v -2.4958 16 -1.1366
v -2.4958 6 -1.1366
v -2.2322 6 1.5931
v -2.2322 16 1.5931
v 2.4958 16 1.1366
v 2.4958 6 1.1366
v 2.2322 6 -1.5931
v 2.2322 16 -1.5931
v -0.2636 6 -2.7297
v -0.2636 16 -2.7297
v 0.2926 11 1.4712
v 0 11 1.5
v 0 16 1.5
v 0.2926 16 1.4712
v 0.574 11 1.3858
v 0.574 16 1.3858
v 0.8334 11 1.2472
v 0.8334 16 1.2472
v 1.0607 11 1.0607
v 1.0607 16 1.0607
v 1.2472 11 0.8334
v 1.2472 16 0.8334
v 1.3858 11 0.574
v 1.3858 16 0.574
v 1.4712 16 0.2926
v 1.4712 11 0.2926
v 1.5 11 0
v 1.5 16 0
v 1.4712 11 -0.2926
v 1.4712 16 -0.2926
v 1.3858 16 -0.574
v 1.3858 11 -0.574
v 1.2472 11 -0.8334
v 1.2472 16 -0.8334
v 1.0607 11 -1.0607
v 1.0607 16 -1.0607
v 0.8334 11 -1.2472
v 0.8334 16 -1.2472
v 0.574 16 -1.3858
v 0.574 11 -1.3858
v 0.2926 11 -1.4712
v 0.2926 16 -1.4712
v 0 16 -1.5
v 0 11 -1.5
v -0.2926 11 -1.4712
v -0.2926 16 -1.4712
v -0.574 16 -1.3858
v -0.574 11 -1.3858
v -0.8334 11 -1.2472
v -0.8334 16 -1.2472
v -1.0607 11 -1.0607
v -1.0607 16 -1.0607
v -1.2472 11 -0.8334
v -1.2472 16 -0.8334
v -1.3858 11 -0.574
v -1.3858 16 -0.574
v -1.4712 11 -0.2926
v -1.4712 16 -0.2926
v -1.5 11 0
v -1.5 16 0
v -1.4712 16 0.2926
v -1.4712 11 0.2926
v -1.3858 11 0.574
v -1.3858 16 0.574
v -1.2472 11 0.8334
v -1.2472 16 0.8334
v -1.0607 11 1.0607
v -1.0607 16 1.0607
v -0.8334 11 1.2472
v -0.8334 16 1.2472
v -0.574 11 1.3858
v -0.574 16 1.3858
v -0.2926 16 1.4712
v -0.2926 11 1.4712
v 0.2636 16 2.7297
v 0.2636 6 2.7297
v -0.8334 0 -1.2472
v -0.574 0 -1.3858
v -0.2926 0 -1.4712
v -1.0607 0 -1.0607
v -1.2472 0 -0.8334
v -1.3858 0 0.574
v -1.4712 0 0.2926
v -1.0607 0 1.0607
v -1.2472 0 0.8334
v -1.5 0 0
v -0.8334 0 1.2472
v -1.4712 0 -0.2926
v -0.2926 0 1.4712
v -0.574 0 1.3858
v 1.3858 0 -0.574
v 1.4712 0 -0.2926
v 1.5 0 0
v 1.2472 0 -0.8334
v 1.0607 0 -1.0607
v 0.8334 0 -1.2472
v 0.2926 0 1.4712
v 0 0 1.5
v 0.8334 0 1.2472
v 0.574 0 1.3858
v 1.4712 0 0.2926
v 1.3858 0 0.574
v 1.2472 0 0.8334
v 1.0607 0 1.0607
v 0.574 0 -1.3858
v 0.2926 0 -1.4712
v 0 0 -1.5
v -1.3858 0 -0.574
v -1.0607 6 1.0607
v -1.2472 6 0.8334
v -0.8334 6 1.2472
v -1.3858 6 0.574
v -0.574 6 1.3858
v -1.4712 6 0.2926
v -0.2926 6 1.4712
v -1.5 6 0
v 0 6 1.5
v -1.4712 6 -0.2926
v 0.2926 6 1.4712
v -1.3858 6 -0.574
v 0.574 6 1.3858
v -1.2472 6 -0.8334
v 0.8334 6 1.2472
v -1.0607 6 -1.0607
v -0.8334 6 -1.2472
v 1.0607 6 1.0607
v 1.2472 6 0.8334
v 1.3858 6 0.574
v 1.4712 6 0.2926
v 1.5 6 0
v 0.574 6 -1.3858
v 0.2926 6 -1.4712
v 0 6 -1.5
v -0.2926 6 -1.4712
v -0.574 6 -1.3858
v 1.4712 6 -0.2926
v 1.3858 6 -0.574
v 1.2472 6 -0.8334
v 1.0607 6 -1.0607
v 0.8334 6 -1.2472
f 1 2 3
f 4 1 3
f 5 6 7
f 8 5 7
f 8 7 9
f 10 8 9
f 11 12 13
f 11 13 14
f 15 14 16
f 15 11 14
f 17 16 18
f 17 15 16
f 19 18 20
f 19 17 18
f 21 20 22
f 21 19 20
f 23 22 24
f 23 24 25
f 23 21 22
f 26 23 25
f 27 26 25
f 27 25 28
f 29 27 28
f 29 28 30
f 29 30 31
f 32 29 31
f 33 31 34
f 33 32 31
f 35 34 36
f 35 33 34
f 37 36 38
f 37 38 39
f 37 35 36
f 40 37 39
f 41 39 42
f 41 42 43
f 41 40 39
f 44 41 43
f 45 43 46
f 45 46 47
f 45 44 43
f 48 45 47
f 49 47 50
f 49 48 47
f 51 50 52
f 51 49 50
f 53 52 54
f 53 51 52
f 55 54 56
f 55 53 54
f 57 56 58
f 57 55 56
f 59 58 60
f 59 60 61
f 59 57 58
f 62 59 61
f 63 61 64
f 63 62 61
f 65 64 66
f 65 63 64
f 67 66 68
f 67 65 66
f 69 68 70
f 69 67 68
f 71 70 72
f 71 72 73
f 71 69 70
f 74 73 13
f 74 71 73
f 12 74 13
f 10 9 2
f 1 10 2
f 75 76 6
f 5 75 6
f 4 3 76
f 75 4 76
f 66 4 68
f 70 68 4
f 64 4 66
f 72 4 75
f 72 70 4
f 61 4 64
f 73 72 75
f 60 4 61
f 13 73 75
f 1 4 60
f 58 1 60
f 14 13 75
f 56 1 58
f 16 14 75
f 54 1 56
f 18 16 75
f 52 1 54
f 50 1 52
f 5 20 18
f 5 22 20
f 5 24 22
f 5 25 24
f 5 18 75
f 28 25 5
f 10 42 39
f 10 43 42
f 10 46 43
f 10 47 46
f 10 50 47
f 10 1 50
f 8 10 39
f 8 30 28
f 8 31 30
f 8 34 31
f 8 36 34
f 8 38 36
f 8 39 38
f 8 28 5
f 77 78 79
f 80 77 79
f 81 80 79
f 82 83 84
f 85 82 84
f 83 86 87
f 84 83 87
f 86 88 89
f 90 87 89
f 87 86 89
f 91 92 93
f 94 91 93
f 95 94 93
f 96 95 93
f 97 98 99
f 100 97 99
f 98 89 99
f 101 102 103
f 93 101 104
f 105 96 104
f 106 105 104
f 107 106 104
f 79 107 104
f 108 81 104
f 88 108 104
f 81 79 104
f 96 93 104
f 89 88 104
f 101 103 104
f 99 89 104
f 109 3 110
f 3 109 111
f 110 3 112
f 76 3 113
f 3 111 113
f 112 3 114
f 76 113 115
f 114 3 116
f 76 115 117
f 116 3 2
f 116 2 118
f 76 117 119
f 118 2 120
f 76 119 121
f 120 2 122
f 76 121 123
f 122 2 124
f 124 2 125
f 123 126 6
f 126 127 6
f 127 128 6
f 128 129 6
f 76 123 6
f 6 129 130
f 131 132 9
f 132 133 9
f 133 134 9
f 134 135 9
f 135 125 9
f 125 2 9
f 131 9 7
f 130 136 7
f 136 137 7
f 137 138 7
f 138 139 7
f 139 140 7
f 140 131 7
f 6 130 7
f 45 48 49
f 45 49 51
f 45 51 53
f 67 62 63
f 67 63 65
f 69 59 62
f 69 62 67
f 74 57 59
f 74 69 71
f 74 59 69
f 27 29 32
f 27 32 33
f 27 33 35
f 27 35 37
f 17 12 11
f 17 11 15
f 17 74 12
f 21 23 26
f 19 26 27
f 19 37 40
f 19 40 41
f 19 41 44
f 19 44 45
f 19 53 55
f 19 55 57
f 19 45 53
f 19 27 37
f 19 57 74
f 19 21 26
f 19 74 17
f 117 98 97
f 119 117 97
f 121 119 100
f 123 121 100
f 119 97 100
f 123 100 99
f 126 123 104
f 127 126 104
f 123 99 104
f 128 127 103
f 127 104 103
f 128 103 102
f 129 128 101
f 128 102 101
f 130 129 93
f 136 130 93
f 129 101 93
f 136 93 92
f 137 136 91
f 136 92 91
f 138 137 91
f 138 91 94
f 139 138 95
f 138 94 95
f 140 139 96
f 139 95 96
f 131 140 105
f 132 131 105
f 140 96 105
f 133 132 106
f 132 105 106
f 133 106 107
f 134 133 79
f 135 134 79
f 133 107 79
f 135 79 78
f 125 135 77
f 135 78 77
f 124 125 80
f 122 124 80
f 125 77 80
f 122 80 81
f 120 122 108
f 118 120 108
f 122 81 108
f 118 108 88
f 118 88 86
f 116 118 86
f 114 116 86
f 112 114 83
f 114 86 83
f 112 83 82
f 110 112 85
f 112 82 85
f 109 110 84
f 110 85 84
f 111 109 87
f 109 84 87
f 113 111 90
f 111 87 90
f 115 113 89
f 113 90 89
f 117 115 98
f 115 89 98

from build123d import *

# Parameters (mm, degrees)
SKETCH_1_R          = 1.5
EXTRUDE_1_DEPTH     = 6
EXTRUDE_2_DEPTH     = 10
CUT_EXTRUDE_START   = -5
SKETCH_3_R          = 1.5
CUT_EXTRUDE_1_DEPTH = 5


with BuildPart() as part:
    # 草图1 → 凸台-拉伸1 (new body)
    with BuildSketch(Plane(origin=(0, 0, 0), x_dir=(1, 0, 0), z_dir=(0, 1, 0))):
        with Locations(Location((0, 0, 0), (0, 0, 270))):
            Circle(SKETCH_1_R)
    extrude(amount=EXTRUDE_1_DEPTH)

    # 草图2 → 凸台-拉伸2 (add)
    with BuildSketch(Plane(origin=(0, 6, 0), x_dir=(1, 0, 0), z_dir=(0, 1, 0))):
        Polygon((2.495784313, -1.136615149), (2.23222975, 1.593105043), (-0.263554563, 2.729720192), (-2.495784313, 1.136615149), (-2.23222975, -1.593105043), (0.263554563, -2.729720192), align=None)
    extrude(amount=EXTRUDE_2_DEPTH)

    # 草图3 → 切除-拉伸1 (cut)
    with BuildSketch(Plane(origin=(0, 16, 0), x_dir=(1, 0, 0), z_dir=(0, 1, 0)).offset(CUT_EXTRUDE_START)):
        with Locations(Location((0, 0, 0), (0, 0, 270))):
            Circle(SKETCH_3_R)
    extrude(amount=CUT_EXTRUDE_1_DEPTH, mode=Mode.SUBTRACT)


solid = part.part
